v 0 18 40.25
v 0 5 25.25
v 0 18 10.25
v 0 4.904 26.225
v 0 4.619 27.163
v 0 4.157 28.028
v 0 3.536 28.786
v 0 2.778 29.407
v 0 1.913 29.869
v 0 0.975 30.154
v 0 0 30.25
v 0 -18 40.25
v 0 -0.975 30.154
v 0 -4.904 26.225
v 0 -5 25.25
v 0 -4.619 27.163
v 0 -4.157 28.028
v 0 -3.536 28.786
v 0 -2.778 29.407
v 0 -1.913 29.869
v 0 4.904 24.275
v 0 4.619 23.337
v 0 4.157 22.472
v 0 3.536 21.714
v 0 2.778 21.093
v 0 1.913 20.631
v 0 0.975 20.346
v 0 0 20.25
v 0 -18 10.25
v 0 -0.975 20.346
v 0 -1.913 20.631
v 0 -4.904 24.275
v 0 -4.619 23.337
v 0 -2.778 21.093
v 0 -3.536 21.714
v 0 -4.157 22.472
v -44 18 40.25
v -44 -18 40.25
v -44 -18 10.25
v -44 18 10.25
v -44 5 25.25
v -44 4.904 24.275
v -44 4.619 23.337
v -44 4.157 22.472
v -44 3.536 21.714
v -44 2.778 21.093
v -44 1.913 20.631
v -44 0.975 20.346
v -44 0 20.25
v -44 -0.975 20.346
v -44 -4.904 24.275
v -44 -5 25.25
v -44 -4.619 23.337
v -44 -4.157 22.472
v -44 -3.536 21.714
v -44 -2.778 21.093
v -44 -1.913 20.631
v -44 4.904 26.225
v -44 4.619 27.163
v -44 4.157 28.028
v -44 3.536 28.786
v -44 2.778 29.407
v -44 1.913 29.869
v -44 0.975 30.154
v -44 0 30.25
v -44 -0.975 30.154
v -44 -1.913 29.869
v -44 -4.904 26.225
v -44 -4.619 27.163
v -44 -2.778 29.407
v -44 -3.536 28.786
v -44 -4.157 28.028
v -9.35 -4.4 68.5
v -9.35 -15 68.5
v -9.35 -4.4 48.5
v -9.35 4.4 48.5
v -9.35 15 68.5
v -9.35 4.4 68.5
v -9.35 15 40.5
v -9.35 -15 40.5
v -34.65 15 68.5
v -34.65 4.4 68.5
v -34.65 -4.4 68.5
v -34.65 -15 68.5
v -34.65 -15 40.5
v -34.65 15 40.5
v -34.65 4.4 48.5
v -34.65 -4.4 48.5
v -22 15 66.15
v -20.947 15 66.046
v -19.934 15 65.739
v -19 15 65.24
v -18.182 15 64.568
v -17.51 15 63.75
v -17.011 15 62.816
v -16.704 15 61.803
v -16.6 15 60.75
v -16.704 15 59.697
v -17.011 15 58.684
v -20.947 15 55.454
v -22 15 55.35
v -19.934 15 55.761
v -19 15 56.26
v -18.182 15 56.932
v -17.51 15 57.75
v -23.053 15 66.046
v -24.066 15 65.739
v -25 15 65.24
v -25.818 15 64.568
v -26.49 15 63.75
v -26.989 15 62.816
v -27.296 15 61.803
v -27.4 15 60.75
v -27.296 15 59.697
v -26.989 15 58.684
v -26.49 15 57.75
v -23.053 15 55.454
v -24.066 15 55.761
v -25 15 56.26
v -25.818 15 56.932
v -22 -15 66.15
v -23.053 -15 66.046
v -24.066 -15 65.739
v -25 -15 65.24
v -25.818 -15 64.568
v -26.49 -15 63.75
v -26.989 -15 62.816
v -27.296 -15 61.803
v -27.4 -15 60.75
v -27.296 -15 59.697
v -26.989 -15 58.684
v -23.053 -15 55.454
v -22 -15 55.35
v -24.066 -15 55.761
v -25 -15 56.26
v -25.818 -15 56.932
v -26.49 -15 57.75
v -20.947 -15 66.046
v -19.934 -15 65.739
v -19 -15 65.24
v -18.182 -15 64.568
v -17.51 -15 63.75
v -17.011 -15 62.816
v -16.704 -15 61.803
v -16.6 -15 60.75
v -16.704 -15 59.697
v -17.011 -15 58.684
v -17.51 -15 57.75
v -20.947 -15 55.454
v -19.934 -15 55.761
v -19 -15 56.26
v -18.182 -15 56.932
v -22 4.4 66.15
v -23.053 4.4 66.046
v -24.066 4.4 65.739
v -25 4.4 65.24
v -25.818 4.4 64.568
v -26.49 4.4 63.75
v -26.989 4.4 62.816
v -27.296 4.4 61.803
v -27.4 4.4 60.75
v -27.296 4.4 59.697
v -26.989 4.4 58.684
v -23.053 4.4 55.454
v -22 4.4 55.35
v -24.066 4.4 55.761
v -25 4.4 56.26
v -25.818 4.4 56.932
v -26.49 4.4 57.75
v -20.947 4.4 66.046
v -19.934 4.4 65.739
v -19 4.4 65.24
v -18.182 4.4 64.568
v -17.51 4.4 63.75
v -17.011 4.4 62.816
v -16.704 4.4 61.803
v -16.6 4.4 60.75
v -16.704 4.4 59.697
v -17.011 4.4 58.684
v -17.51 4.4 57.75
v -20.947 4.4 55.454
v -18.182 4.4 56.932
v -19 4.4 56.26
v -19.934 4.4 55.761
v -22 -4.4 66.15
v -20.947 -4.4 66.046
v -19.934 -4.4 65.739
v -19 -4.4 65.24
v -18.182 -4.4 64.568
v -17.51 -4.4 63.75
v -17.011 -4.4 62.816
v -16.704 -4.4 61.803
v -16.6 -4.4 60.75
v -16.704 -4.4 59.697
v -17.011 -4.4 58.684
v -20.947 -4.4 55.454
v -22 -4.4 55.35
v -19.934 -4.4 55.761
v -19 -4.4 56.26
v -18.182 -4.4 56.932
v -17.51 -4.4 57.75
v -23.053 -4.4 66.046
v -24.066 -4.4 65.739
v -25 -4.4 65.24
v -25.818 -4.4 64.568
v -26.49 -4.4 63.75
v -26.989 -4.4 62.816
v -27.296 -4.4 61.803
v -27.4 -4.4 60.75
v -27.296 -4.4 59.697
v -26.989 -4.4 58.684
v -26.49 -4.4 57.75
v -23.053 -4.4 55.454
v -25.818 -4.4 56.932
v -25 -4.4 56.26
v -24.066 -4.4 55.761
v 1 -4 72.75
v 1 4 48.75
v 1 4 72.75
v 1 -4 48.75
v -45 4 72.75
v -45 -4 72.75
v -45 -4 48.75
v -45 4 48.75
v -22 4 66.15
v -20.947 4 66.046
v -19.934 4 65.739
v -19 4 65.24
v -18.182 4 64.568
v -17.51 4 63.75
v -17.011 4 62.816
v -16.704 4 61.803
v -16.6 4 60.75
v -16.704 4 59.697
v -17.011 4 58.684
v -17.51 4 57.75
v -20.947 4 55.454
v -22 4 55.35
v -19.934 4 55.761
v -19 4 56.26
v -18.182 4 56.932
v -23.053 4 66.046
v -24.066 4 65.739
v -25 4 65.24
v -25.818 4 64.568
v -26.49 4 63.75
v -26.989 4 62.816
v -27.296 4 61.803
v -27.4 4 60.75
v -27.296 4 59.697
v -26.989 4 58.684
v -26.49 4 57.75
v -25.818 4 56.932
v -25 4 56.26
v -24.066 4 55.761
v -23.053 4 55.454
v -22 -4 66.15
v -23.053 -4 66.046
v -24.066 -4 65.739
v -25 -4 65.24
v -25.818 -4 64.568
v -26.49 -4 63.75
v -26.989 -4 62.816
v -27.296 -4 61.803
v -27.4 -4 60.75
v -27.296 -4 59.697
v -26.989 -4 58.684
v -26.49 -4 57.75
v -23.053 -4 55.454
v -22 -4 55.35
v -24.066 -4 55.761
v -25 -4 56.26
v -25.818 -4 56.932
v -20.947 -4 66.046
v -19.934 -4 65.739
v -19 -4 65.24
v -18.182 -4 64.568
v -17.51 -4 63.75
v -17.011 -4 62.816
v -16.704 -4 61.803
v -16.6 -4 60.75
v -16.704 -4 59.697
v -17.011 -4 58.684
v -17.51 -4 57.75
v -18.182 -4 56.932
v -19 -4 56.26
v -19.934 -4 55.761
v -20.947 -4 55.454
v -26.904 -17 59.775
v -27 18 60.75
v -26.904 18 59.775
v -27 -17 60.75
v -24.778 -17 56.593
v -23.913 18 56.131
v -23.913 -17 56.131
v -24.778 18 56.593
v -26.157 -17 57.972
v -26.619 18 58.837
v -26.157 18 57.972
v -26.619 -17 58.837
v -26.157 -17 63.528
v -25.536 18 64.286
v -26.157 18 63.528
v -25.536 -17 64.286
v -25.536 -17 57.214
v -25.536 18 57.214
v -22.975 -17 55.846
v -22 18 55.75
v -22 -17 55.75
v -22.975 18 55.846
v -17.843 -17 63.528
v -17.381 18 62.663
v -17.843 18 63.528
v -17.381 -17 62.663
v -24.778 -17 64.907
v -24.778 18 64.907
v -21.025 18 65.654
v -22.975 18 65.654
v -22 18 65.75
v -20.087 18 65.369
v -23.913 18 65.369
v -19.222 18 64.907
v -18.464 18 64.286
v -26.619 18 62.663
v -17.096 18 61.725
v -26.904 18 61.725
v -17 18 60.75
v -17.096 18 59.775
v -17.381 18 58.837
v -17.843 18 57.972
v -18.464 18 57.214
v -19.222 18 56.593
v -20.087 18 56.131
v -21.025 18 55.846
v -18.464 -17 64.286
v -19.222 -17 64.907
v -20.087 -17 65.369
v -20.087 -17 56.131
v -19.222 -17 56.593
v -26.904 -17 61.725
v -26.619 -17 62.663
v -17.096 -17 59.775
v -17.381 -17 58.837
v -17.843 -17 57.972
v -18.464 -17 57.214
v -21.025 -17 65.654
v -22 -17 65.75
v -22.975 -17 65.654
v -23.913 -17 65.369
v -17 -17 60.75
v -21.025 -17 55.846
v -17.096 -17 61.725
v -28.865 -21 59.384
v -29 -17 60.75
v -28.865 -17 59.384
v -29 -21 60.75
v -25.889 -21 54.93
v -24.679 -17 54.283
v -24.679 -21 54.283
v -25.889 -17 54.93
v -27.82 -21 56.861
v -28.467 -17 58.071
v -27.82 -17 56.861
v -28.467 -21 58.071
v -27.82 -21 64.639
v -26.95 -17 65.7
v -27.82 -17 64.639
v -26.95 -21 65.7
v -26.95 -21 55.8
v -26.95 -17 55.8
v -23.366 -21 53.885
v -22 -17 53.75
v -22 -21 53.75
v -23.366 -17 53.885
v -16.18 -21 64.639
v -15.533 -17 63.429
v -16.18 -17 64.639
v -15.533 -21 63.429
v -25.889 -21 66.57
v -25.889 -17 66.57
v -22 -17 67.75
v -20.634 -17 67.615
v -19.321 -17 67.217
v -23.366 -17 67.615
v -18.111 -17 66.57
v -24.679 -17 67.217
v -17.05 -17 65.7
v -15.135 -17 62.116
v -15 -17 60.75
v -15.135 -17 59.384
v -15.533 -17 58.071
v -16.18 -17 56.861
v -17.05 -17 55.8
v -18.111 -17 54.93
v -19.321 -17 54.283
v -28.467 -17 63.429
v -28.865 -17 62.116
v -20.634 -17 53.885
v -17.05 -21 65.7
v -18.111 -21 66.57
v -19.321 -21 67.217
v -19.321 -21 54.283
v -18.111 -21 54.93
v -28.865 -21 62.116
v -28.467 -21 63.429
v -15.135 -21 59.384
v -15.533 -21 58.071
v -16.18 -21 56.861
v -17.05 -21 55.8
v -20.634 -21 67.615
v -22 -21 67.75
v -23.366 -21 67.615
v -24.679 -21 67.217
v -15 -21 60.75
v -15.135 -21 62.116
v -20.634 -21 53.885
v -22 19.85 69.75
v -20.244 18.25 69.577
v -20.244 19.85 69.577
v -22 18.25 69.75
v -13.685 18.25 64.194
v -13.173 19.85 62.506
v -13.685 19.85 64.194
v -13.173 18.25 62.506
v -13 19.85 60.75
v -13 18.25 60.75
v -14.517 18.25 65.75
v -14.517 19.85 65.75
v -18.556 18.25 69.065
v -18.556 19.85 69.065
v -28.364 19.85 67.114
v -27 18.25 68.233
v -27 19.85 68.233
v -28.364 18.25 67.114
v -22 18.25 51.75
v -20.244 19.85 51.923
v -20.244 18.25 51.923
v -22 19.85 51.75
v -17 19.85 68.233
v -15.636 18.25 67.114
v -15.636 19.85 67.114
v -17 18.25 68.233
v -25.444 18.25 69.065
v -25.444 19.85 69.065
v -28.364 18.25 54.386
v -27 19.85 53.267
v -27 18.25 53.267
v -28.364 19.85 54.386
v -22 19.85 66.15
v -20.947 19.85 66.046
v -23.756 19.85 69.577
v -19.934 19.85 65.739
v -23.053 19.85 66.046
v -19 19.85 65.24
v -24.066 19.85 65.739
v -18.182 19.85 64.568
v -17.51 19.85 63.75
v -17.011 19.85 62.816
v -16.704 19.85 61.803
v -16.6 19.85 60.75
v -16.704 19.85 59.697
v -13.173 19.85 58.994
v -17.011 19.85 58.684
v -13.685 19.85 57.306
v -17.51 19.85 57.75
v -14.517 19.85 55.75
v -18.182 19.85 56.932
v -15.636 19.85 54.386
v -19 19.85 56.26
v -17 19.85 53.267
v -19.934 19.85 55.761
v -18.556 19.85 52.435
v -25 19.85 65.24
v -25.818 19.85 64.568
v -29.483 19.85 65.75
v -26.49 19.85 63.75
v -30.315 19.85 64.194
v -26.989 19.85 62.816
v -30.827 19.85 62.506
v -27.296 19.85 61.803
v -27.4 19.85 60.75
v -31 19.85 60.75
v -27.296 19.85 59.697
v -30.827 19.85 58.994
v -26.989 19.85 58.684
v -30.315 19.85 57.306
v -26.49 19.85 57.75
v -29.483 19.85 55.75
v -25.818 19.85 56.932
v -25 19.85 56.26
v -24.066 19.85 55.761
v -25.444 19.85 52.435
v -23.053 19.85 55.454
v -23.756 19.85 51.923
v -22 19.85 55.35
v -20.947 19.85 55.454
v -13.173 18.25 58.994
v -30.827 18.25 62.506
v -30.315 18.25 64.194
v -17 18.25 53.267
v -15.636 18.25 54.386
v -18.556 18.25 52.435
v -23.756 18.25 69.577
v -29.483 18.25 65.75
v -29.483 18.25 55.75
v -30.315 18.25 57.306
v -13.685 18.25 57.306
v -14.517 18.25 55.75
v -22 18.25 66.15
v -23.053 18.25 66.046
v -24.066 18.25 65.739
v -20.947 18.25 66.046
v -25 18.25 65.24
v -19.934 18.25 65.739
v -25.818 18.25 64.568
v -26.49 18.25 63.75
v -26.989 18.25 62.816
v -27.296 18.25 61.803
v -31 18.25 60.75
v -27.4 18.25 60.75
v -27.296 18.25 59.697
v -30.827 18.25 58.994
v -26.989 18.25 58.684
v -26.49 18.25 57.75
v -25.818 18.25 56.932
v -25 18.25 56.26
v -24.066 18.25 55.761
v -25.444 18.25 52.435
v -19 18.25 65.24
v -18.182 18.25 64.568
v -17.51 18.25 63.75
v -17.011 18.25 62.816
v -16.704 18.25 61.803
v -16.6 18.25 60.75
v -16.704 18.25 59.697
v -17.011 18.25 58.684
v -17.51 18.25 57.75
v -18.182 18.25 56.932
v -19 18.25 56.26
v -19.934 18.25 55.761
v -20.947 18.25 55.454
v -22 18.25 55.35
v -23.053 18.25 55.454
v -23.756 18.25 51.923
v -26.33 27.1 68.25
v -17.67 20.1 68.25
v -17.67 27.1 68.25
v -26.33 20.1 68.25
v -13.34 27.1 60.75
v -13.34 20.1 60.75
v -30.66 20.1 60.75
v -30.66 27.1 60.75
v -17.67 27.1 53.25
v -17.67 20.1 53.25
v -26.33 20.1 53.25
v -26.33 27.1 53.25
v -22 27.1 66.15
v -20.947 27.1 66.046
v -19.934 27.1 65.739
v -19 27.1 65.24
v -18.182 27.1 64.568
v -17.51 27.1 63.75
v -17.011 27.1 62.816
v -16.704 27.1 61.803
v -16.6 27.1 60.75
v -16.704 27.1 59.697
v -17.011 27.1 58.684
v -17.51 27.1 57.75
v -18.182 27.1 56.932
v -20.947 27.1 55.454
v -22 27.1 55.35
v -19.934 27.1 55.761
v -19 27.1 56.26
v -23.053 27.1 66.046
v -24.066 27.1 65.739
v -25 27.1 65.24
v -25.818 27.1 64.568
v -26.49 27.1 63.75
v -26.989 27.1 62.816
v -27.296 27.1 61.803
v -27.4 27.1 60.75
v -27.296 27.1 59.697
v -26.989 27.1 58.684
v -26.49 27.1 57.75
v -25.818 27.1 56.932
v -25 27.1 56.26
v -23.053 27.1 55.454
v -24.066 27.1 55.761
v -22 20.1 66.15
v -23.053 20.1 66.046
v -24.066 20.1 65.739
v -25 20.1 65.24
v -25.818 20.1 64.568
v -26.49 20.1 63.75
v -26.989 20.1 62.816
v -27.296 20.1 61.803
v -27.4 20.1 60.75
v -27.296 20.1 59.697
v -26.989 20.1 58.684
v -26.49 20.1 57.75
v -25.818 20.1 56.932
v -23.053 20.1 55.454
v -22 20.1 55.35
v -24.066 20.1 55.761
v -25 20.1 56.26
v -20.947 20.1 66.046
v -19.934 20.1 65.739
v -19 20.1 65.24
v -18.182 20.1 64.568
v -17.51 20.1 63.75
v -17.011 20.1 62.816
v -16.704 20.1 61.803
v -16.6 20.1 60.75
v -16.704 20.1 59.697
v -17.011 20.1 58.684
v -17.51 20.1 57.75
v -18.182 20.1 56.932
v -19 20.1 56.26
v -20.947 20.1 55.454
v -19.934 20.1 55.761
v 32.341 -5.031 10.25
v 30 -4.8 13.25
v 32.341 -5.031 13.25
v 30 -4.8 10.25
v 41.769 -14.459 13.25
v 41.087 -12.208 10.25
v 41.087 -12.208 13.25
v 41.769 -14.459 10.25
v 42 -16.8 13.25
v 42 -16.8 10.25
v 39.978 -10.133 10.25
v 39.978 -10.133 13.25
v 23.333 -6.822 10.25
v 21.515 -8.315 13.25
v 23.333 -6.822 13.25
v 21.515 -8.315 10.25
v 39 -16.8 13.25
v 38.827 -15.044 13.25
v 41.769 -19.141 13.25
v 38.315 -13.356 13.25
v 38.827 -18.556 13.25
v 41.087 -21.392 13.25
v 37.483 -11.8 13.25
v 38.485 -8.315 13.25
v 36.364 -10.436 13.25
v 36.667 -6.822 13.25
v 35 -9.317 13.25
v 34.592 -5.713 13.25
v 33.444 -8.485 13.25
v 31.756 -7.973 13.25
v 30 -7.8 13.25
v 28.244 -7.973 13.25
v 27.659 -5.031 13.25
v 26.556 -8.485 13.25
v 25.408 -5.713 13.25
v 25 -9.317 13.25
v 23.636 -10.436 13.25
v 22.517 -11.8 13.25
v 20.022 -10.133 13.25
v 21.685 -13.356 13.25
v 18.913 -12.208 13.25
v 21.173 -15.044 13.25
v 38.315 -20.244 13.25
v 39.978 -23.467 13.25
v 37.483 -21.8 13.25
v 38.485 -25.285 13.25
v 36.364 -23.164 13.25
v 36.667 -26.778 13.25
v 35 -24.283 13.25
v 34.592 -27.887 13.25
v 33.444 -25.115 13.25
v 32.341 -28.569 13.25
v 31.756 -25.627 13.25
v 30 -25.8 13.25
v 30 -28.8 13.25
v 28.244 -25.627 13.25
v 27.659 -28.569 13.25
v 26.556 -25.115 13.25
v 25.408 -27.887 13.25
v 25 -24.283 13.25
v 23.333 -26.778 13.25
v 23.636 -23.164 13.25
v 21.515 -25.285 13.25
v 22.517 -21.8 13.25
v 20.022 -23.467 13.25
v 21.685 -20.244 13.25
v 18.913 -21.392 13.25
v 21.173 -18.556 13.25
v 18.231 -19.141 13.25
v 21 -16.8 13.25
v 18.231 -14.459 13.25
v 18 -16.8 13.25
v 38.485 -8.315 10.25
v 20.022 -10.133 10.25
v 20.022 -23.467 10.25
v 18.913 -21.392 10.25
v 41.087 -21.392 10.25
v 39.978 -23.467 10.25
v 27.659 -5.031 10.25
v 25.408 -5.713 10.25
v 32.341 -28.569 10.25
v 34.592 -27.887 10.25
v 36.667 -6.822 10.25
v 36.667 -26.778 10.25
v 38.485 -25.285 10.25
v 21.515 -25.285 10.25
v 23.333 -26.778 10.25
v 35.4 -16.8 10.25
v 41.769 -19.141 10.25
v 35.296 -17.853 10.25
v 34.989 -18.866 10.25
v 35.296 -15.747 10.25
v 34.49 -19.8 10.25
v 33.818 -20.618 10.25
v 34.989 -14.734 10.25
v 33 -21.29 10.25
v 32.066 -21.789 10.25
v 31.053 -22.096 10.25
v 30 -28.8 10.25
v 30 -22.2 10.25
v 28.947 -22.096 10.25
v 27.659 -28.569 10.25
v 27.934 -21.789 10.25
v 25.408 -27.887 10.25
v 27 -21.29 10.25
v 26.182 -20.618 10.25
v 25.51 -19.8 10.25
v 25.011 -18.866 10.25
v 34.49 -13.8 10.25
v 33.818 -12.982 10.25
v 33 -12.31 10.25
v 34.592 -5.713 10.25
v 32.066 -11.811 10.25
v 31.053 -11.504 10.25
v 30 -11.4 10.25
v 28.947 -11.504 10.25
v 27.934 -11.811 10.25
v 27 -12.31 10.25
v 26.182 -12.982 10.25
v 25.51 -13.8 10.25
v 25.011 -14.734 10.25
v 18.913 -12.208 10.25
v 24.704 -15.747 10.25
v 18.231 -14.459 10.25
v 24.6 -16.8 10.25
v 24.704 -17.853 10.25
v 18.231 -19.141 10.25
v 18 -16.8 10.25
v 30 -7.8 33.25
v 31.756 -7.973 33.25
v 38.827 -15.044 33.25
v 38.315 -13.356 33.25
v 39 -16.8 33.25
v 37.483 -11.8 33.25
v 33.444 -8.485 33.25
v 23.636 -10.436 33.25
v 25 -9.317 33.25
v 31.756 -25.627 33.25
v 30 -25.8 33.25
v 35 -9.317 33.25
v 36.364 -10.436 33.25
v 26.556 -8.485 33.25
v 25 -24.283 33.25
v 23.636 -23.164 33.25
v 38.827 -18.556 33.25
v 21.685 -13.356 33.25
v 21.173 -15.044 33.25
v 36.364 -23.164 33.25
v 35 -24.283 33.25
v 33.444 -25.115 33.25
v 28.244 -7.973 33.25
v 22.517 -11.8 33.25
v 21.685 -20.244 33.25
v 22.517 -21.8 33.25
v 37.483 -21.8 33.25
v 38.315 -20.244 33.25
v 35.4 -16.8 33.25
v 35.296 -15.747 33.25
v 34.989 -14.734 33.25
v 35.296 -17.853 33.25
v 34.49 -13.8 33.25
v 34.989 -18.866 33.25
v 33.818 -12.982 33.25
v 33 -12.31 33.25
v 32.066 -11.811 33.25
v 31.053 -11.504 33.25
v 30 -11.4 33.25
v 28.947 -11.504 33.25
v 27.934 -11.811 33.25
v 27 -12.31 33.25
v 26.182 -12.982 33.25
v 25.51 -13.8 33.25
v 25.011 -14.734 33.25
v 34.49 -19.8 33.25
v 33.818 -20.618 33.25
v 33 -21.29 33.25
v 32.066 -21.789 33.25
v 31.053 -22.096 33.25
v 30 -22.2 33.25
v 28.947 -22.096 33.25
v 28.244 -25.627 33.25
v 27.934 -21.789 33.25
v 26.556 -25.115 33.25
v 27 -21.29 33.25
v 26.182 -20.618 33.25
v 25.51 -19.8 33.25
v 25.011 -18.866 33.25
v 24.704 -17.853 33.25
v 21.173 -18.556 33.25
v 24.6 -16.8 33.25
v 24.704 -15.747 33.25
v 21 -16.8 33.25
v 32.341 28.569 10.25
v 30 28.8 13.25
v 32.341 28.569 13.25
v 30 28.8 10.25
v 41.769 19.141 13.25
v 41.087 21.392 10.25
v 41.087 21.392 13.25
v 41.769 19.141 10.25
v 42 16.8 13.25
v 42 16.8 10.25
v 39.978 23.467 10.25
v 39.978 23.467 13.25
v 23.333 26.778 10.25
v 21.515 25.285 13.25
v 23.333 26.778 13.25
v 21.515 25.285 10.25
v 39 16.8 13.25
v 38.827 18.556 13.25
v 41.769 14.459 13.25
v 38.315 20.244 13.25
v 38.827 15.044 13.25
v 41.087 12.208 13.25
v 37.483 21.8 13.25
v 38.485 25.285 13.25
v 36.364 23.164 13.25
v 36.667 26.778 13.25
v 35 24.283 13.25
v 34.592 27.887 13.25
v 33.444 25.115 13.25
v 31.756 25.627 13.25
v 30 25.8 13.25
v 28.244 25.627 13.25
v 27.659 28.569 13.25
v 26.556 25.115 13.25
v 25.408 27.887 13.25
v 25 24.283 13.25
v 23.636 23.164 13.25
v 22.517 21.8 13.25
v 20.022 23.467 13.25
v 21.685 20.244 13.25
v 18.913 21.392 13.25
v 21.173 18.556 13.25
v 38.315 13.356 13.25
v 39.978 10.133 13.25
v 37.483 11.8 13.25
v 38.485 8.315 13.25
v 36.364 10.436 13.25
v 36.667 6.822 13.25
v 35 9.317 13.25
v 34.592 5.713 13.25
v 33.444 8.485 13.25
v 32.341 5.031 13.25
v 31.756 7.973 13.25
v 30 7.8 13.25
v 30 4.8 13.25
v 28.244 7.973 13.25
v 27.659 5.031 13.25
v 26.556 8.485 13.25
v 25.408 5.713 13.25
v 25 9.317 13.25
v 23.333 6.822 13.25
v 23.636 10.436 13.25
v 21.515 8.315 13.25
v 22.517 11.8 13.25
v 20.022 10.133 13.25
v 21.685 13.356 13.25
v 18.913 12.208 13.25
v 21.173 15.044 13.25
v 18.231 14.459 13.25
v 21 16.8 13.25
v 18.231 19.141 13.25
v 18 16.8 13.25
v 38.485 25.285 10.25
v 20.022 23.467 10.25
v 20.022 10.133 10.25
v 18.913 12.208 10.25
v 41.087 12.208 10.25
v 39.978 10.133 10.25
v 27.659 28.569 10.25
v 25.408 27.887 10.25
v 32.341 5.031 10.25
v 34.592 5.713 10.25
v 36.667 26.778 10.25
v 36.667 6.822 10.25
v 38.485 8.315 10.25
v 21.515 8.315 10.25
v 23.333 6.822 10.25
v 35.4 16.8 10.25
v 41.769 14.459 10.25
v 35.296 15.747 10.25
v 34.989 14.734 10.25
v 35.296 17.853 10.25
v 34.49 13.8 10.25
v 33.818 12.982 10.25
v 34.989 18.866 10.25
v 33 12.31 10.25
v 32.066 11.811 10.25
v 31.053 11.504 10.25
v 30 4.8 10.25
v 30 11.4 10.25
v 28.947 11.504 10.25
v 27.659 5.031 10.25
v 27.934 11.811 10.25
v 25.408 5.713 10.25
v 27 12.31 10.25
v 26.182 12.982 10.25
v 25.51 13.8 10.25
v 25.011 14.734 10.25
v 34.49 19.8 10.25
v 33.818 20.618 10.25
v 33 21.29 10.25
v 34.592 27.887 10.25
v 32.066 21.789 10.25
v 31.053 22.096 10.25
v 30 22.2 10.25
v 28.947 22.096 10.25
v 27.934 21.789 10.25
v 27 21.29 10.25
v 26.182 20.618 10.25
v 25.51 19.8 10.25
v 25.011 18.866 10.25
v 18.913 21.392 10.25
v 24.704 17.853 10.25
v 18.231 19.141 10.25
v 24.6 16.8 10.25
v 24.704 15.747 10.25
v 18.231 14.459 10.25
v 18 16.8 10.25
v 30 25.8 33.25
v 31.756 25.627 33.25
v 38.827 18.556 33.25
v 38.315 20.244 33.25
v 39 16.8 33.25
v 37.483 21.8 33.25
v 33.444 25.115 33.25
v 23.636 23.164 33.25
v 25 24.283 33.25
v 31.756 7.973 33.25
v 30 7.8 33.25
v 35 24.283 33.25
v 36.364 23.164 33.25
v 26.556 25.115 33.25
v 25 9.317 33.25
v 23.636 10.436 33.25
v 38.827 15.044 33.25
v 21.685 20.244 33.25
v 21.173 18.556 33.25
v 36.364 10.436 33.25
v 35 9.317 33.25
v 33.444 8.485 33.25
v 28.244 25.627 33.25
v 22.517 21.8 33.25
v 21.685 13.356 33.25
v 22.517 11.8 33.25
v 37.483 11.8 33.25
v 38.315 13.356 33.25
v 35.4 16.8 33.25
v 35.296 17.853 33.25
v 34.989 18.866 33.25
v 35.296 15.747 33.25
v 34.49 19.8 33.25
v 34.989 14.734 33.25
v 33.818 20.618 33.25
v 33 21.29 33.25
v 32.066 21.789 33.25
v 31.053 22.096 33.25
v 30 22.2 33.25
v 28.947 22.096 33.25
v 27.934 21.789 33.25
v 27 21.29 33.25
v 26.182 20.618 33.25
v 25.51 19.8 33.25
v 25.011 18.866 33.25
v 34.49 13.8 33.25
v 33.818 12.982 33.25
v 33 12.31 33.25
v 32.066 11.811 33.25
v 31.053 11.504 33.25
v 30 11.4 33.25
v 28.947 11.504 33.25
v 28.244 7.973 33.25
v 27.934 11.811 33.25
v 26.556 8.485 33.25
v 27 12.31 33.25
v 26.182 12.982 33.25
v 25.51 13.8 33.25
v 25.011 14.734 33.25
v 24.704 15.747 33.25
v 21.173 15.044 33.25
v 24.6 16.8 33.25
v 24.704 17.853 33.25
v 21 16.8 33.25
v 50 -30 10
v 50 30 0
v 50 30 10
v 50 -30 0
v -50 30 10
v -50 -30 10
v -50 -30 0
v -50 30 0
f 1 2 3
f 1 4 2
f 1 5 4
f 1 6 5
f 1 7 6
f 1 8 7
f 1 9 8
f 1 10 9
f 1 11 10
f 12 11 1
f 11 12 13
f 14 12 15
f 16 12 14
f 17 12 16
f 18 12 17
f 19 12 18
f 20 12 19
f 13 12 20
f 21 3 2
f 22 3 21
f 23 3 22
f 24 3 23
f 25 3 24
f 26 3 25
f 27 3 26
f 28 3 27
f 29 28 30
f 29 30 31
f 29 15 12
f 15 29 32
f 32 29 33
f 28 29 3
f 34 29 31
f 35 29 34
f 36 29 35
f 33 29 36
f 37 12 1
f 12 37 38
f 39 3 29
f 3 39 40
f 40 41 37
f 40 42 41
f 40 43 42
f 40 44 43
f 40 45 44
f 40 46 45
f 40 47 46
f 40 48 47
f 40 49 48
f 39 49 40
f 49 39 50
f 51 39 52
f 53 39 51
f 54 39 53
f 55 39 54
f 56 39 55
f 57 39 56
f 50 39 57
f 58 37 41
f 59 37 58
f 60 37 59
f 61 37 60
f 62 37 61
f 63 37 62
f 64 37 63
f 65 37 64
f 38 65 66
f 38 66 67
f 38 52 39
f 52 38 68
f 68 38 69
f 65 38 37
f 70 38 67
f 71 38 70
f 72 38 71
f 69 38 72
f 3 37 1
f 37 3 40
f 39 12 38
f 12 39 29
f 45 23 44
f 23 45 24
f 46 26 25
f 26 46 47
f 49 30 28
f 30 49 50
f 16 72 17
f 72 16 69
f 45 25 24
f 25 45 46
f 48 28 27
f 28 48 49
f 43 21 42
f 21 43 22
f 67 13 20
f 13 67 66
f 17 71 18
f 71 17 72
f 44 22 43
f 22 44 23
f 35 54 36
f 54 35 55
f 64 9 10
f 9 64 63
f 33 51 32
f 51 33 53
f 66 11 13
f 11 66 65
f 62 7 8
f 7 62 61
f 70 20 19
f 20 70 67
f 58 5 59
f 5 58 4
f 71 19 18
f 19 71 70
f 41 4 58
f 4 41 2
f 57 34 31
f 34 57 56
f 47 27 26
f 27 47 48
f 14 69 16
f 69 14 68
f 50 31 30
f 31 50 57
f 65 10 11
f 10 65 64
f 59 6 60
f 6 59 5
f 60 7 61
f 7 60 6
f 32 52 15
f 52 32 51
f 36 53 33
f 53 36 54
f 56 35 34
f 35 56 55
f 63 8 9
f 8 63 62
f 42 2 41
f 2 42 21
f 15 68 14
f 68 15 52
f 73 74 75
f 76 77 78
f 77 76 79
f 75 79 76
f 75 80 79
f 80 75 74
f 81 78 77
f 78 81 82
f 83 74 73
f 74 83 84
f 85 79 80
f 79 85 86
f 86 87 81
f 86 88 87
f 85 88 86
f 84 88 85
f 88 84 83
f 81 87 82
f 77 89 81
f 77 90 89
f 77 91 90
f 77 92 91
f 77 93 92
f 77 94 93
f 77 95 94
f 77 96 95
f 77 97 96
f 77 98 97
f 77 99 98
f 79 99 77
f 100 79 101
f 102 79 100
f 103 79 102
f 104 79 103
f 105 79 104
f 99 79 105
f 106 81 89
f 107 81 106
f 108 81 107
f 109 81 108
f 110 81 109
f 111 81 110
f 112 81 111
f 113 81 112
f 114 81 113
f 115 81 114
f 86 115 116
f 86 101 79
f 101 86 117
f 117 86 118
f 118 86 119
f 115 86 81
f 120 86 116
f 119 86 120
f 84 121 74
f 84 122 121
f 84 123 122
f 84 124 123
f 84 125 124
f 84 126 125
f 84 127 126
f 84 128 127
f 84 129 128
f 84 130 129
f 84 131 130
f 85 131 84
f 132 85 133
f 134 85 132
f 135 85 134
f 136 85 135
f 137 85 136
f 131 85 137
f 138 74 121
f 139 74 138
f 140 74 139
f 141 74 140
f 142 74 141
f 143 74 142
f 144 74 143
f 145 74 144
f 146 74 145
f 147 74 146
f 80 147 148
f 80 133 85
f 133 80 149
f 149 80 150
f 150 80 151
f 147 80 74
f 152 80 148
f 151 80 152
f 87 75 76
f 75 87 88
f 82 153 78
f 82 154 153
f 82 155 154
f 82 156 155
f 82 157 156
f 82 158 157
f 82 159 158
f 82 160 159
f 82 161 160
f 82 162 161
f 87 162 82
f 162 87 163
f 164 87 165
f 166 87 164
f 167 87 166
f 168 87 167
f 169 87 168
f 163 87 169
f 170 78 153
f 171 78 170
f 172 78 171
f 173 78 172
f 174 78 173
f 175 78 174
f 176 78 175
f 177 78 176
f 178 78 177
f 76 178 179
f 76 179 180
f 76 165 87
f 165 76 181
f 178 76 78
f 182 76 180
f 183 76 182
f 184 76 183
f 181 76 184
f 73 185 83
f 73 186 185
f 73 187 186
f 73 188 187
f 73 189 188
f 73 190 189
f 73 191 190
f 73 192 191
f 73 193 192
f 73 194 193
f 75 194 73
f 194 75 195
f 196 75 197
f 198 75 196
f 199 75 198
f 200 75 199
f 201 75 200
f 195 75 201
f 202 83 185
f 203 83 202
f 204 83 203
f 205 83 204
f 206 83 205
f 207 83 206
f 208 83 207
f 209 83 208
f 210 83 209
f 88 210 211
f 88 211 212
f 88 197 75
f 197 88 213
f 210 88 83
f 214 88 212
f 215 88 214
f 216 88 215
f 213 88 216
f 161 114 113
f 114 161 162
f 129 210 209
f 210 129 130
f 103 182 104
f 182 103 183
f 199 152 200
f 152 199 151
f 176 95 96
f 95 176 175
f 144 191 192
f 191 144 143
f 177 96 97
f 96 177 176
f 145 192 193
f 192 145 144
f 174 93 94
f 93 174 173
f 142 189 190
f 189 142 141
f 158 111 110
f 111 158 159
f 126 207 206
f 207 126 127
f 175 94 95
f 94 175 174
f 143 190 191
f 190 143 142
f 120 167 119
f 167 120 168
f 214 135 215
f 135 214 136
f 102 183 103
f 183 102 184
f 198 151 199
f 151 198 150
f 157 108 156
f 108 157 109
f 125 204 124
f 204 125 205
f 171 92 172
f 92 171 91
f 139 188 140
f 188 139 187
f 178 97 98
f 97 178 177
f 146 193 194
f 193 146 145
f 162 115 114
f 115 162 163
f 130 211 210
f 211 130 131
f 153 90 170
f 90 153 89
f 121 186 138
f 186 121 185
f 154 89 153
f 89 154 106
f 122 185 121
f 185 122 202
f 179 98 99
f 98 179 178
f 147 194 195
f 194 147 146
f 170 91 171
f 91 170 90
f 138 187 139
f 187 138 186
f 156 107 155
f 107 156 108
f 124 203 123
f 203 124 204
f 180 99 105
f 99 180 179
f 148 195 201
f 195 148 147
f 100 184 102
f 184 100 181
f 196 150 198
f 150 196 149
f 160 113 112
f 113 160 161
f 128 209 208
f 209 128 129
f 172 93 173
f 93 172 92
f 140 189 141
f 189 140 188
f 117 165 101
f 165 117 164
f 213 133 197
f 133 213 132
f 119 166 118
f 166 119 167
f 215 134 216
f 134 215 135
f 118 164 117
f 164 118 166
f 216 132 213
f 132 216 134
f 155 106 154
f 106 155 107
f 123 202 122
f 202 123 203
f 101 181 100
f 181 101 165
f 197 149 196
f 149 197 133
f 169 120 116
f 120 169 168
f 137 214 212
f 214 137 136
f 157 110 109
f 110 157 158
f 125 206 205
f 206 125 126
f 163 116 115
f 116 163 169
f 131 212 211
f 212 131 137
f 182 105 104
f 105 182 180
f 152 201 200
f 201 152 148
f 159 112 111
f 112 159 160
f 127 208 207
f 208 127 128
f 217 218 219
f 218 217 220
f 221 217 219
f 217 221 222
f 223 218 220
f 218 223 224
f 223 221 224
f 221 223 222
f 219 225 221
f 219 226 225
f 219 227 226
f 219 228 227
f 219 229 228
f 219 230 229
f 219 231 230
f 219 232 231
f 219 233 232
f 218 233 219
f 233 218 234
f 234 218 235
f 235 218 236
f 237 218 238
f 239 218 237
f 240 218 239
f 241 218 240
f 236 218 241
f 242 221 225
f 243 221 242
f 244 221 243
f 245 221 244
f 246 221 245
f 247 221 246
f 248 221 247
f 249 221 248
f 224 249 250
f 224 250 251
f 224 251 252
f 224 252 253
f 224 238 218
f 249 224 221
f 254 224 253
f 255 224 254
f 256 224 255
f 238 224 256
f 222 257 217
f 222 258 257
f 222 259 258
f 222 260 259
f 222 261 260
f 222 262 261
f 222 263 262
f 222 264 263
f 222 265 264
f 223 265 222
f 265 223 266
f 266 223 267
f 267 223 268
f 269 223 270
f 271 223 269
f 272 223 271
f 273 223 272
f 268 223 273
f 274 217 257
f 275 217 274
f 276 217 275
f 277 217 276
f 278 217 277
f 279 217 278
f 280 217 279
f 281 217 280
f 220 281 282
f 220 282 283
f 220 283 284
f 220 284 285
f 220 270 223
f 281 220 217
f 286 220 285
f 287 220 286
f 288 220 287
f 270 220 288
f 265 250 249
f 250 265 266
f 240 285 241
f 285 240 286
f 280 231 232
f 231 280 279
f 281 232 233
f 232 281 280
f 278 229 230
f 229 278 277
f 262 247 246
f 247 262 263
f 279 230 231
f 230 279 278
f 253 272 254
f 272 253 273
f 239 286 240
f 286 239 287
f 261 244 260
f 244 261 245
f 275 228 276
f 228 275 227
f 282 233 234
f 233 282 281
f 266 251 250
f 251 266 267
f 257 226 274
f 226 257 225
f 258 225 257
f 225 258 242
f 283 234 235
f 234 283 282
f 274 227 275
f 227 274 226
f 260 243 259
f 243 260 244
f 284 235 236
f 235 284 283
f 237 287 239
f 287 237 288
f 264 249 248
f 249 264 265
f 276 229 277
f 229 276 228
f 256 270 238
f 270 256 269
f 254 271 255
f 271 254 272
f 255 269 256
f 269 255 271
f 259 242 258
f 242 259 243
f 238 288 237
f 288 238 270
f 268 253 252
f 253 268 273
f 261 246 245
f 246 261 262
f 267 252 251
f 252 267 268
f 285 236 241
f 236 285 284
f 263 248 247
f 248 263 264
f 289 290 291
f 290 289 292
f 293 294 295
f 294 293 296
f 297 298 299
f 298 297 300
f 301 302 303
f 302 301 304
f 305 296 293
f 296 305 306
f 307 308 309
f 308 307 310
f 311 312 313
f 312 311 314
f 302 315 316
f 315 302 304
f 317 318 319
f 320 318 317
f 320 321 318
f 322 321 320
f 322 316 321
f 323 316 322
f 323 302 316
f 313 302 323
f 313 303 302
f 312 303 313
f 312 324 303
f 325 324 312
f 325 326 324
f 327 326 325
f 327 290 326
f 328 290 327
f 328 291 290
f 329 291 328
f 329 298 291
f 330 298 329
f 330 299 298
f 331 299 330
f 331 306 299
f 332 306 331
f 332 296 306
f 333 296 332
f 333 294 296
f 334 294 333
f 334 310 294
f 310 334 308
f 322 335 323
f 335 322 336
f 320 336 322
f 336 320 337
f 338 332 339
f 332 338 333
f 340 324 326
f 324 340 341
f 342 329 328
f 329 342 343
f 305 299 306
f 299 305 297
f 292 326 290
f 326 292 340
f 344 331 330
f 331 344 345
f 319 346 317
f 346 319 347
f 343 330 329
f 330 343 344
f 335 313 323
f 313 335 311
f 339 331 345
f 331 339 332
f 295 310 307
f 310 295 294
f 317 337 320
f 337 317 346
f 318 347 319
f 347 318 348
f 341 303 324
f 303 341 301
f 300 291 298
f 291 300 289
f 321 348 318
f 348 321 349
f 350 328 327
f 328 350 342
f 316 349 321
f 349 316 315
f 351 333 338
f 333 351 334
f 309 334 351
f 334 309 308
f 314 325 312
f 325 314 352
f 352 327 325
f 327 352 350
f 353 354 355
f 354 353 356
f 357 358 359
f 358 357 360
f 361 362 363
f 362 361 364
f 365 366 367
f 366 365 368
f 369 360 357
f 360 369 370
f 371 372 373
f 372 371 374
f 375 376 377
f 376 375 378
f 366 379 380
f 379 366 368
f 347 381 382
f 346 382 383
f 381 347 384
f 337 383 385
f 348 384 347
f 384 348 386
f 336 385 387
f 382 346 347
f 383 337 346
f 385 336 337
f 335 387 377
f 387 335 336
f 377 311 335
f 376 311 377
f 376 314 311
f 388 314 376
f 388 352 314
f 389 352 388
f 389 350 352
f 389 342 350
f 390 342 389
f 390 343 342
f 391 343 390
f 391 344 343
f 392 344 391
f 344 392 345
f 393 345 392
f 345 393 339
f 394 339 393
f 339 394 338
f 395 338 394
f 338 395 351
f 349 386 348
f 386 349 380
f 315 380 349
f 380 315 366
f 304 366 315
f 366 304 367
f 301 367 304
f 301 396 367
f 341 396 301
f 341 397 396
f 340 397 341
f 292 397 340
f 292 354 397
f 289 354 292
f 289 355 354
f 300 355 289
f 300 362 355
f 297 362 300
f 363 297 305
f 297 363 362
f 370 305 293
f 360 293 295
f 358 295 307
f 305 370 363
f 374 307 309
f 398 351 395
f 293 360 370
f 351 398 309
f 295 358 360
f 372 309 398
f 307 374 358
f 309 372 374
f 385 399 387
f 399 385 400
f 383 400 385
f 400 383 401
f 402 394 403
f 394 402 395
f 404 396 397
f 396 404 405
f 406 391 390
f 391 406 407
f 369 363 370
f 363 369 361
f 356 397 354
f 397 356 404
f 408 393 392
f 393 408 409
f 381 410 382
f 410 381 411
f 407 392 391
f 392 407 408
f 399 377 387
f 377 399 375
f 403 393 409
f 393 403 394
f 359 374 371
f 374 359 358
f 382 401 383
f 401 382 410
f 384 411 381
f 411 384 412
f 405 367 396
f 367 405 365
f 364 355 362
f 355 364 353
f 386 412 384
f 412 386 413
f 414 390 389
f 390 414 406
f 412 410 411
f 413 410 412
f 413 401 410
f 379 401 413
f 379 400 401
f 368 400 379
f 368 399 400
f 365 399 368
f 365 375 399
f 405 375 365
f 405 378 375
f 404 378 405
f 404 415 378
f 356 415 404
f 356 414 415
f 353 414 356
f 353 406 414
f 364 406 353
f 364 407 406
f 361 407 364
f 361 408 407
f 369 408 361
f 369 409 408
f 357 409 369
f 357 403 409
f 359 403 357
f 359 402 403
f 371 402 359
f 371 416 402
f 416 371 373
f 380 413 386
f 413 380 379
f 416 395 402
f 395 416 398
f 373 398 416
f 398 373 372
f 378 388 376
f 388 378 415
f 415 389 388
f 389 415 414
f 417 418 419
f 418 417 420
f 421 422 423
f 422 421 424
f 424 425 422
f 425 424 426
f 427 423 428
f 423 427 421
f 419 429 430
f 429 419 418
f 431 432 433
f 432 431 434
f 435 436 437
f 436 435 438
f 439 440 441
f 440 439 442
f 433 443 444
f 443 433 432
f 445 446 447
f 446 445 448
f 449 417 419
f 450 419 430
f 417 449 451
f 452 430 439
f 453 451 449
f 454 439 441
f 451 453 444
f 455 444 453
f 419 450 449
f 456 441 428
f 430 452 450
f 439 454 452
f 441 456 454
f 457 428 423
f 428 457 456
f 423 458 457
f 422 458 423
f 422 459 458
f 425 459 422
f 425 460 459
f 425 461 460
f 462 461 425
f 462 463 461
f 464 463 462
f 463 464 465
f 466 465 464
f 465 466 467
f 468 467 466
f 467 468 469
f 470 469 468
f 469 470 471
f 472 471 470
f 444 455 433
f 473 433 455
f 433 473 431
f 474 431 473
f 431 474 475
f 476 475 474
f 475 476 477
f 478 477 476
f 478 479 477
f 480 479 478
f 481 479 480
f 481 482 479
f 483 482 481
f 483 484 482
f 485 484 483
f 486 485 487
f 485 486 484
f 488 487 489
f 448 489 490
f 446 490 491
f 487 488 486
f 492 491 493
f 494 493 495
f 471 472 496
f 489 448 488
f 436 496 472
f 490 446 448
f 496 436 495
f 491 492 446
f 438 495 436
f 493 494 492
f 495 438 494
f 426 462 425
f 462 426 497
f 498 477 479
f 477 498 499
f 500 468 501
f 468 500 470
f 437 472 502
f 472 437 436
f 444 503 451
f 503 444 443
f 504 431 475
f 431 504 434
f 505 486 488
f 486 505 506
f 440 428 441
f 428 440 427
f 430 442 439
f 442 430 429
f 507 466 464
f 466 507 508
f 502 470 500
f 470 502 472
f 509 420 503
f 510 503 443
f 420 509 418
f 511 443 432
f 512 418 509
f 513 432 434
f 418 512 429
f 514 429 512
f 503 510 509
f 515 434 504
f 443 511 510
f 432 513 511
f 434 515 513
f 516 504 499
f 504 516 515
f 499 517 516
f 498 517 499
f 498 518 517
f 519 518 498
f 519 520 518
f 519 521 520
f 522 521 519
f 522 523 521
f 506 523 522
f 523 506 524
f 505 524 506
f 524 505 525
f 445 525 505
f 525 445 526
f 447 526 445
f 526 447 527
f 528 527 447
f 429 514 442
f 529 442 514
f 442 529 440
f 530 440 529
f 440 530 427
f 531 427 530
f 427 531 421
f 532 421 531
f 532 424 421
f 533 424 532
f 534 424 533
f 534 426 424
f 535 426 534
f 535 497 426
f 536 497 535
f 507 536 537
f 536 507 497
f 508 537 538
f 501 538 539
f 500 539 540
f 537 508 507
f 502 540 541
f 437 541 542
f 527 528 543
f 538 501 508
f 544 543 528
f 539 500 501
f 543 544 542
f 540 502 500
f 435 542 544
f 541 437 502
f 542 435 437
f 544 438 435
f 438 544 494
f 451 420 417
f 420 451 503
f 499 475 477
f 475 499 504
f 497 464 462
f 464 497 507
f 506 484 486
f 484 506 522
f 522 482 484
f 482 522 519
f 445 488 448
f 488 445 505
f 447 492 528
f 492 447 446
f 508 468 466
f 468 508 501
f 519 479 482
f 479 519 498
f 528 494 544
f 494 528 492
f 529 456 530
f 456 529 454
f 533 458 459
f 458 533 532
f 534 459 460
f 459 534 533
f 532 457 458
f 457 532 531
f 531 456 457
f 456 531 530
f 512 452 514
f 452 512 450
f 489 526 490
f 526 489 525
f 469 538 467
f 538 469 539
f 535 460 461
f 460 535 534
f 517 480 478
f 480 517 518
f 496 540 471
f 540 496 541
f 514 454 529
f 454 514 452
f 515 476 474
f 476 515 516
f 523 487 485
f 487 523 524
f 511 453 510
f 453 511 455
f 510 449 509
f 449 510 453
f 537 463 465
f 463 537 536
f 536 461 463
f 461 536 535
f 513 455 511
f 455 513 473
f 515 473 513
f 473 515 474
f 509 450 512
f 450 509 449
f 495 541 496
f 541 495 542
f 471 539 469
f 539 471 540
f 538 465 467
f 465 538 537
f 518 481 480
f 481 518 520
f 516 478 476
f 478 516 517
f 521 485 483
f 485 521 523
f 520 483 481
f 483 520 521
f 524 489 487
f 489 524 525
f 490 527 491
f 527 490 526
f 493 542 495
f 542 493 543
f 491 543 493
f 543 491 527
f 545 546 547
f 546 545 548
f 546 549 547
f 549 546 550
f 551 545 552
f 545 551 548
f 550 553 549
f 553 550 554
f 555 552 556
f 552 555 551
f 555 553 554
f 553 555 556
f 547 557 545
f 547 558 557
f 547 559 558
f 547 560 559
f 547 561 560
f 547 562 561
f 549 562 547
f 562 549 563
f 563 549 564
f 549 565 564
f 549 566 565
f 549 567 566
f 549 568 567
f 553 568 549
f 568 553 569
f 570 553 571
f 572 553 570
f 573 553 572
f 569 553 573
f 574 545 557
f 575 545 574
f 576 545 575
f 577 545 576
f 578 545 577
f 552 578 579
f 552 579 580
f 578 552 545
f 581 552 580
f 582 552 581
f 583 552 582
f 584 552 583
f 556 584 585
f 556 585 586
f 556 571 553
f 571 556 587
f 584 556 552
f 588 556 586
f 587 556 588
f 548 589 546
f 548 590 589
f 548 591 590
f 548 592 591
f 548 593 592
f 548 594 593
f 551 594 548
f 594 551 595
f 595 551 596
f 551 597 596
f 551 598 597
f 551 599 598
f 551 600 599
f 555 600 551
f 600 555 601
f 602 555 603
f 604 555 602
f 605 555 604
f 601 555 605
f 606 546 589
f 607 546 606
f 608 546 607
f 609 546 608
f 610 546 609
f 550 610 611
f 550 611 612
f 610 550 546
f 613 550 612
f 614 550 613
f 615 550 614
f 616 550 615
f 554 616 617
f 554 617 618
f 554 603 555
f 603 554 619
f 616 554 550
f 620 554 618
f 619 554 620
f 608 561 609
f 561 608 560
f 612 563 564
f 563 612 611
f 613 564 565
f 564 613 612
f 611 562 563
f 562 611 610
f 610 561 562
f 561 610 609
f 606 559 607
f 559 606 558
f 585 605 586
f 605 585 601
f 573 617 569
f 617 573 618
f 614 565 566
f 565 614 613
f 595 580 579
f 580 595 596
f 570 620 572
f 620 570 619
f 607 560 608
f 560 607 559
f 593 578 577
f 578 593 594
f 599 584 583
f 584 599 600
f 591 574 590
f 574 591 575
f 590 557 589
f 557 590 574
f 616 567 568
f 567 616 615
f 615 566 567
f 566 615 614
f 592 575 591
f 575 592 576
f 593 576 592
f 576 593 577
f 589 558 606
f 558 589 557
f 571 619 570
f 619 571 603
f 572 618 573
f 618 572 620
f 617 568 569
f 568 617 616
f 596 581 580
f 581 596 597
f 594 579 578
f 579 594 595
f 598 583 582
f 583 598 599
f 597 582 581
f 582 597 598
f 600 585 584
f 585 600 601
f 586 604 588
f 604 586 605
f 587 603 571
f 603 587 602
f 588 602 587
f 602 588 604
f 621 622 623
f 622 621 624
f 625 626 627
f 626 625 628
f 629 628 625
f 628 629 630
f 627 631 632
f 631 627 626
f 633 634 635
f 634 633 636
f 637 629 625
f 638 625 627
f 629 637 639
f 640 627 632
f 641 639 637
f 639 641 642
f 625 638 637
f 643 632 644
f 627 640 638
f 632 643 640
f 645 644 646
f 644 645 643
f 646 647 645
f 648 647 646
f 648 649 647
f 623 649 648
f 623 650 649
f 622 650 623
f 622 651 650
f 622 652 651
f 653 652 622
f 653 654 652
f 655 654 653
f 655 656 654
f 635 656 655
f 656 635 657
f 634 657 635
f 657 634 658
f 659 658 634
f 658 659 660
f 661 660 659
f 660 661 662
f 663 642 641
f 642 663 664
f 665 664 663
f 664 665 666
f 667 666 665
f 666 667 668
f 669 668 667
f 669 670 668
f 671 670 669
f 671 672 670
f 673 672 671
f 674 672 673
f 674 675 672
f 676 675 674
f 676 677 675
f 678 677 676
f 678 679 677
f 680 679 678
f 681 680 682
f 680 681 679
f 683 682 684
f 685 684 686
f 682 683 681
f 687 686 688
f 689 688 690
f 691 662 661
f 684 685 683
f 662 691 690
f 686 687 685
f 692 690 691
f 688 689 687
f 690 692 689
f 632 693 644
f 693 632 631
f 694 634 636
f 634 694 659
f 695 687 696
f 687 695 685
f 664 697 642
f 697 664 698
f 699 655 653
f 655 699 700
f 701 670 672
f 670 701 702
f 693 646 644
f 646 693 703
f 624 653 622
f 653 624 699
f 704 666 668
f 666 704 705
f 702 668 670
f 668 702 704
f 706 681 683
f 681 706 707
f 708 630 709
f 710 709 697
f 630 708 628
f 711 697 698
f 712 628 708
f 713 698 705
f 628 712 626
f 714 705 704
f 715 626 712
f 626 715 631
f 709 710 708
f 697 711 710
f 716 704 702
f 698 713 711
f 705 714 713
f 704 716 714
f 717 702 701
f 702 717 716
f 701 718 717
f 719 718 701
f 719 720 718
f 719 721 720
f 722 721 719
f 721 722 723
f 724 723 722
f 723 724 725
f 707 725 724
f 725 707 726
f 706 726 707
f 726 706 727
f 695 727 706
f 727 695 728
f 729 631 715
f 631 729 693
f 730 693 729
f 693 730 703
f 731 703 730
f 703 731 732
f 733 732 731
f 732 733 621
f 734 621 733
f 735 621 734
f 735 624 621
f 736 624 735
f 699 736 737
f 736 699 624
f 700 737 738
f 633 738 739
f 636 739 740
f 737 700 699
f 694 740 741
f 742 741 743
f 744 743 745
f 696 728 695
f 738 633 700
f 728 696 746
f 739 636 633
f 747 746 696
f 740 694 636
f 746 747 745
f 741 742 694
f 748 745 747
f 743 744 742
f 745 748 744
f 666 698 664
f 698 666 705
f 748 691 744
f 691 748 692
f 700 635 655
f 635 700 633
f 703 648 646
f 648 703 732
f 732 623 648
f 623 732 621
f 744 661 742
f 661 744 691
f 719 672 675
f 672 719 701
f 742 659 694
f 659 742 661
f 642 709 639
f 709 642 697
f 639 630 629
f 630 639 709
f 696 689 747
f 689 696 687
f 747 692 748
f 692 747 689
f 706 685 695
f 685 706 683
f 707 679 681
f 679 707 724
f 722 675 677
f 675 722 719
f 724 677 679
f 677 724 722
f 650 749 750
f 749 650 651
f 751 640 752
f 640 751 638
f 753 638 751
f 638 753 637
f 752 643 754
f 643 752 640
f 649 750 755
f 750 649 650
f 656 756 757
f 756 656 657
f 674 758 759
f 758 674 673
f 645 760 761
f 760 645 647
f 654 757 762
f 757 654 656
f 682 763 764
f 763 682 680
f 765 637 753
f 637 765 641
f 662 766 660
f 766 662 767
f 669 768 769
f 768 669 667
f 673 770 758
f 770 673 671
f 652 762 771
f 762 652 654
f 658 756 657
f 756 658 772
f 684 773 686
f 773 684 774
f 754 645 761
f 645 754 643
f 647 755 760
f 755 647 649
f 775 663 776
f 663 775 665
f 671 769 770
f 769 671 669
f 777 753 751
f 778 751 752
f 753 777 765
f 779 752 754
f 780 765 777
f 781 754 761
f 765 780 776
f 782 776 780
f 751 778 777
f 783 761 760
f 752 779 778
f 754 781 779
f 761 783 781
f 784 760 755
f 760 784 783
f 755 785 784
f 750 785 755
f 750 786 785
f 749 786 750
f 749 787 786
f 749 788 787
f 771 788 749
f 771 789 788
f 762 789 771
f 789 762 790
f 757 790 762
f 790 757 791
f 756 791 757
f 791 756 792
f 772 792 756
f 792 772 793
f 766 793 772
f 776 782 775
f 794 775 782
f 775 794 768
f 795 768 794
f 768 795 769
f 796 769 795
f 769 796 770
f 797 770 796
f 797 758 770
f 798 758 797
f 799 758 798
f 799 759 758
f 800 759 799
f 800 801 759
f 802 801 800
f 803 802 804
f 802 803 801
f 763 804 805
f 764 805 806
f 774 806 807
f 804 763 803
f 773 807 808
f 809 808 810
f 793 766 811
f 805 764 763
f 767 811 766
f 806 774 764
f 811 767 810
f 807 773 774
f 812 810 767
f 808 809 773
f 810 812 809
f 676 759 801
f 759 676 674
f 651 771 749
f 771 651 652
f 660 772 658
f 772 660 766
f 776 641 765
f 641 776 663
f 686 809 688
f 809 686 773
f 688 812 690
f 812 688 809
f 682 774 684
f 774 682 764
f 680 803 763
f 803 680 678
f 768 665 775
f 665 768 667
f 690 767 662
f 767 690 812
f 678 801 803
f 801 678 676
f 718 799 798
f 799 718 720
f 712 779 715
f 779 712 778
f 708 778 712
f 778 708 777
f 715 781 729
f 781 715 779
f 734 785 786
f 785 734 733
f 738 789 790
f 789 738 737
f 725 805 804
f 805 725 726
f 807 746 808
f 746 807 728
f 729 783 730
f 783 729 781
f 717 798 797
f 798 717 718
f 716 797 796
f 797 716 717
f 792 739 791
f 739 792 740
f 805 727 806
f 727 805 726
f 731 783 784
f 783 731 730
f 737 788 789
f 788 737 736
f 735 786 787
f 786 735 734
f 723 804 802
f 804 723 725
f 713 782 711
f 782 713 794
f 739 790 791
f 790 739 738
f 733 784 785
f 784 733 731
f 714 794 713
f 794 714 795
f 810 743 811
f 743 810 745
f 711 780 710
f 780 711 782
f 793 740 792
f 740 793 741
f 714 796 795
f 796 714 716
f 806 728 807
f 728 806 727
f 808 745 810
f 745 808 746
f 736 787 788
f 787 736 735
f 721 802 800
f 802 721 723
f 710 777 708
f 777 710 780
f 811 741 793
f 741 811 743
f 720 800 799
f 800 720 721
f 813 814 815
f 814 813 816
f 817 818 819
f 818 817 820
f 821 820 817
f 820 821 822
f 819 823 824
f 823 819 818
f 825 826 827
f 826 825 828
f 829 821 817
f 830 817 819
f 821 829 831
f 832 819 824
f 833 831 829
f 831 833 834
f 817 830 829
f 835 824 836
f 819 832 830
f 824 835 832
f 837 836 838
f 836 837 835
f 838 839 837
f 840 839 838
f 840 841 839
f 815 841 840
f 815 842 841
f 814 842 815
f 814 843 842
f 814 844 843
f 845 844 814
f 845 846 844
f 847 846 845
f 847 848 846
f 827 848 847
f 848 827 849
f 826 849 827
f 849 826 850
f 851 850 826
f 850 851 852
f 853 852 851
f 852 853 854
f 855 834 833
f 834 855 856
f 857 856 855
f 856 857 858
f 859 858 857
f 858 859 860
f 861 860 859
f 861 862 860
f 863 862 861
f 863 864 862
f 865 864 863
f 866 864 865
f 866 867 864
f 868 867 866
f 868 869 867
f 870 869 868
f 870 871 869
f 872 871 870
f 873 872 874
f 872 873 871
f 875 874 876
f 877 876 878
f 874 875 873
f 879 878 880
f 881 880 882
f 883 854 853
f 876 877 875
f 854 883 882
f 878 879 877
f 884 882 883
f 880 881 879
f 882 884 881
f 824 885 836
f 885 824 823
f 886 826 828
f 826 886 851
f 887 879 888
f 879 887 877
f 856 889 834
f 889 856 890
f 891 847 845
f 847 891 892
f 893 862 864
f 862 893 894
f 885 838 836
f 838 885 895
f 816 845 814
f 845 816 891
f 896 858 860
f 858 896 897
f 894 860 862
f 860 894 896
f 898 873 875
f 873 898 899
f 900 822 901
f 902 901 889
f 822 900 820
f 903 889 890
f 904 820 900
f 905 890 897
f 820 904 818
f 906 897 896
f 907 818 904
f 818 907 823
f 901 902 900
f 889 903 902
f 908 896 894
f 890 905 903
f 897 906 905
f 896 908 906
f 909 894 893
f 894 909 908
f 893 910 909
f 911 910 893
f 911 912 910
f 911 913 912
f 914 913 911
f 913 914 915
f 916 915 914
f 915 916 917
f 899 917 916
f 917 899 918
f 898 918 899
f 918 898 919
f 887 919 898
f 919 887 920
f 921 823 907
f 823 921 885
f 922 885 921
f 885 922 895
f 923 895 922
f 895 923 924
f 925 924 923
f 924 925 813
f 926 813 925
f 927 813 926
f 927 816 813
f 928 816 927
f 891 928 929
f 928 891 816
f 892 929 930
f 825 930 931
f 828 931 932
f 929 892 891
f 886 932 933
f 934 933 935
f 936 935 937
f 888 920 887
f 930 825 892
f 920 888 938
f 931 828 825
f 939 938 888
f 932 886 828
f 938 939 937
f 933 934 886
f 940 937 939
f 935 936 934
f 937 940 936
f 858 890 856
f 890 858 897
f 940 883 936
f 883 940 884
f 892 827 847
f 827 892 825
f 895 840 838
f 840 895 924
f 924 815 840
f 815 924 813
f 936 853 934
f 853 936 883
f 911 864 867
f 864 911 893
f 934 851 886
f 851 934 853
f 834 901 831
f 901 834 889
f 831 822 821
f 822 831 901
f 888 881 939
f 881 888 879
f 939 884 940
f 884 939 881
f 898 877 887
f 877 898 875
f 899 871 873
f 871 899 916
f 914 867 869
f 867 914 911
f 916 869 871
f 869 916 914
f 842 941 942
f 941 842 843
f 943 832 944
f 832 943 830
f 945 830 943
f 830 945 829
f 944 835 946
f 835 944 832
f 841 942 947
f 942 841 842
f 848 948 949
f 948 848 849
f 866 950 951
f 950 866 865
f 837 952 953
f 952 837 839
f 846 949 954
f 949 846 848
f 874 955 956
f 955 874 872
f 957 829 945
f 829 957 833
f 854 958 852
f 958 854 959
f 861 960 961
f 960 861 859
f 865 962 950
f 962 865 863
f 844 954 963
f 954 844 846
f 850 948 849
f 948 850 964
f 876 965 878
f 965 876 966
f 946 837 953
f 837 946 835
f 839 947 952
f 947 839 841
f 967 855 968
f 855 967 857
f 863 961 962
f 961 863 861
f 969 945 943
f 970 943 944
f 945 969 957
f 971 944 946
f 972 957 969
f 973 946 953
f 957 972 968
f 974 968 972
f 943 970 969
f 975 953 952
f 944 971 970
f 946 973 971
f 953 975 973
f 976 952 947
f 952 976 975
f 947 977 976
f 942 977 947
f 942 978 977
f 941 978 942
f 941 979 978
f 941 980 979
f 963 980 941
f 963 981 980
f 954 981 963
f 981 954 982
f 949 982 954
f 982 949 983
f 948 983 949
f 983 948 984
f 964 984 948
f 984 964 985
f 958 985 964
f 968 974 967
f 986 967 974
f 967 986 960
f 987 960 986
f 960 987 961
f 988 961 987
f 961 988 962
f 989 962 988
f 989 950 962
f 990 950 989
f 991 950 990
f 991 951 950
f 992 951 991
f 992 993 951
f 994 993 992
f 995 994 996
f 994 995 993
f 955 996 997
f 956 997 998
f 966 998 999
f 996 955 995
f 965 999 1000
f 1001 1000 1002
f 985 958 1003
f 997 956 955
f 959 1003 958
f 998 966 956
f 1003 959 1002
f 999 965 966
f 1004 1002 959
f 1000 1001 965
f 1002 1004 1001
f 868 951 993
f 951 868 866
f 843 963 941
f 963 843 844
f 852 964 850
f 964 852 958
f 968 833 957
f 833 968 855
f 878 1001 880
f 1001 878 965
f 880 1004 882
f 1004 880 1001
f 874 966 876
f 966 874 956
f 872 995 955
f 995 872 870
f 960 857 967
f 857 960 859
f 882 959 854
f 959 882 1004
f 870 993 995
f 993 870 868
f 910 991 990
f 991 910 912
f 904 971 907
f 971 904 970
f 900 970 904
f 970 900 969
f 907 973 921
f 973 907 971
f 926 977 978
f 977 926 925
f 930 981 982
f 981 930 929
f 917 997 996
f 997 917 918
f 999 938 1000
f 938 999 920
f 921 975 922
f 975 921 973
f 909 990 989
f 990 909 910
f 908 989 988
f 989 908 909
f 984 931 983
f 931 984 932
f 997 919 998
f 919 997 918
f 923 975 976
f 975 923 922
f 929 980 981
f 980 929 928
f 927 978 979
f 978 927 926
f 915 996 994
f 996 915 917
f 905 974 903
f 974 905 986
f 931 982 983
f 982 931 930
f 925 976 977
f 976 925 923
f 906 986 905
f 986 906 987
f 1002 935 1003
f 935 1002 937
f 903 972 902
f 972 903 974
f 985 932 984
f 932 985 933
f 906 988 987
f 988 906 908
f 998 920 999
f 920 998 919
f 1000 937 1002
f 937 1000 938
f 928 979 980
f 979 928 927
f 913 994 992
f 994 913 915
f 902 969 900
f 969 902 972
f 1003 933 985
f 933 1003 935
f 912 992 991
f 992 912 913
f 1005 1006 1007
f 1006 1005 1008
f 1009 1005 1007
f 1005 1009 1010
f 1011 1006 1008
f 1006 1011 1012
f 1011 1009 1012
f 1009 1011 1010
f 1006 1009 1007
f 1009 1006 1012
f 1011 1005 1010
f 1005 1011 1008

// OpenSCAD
$fn = 32;

// ------------------------------------------------------------------------
// Indexing jig: plate 100 x 60 mm, pin d10
// Every part is its own module, assembly() places every instance.
// ------------------------------------------------------------------------

// --- part 1 ---
module jig_plate() {
  difference() {
    translate([-50, -30, 0]) cube([100, 60, 10]);
  }
}

// --- part 2 ---
module locator_block() {
  difference() {
    translate([-22, -18, 0]) cube([44, 36, 30]);
    translate([0, 0, 15]) rotate([0, 90, 0]) cylinder(h = 46, d = 10, center = true);
  }
}

// --- part 3 ---
module index_fork() {
  difference() {
    translate([-12.65, -15, 0]) cube([25.3, 30, 28]);
    translate([-13.65, -4.4, 8]) cube([27.3, 8.8, 21]);
    translate([0, 0, 20.25]) rotate([90, 0, 0]) cylinder(h = 32, d = 10.8, center = true);
  }
}

// --- part 4 ---
module index_arm() {
  difference() {
    translate([-23, -4, 0]) cube([46, 8, 24]);
    translate([0, 0, 12]) rotate([90, 0, 0]) cylinder(h = 10, d = 10.8, center = true);
  }
}

// --- part 5 ---
module index_pin() {
  rotate([0, 90, 0]) cylinder(h = 36, d = 10, center = true);
  translate([-21, 0, 0]) rotate([0, 90, 0]) cylinder(h = 4, d = 14);
}

// --- part 6 ---
module pin_washer() {
  difference() {
      translate([0, 0, 0]) cylinder(h = 1.6, d = 18);
      translate([0, 0, -1]) cylinder(h = 3.6, d = 10.8);
    }
}

// --- part 7 ---
module lock_nut() {
  difference() {
    linear_extrude(height = 7) polygon(points = [[8.66, 0], [4.33, 7.5], [-4.33, 7.5], [-8.66, 0], [-4.33, -7.5], [4.33, -7.5]]);
    translate([0, 0, -1]) cylinder(h = 9, d = 10.8);
  }
}

// --- part 8 ---
module guide_bush_a() {
  difference() {
    union() {
      cylinder(h = 3, d = 24);
      translate([0, 0, 3]) cylinder(h = 20, d = 18);
    }
    translate([0, 0, -1]) cylinder(h = 25, d = 10.8);
  }
}

// --- part 9 ---
module guide_bush_b() {
  difference() {
    union() {
      cylinder(h = 3, d = 24);
      translate([0, 0, 3]) cylinder(h = 20, d = 18);
    }
    translate([0, 0, -1]) cylinder(h = 25, d = 10.8);
  }
}

// --- assembly ---
module assembly() {
  color([0.80, 0.24, 0.20]) translate([0, 0, 0]) rotate([0, 0, 0]) jig_plate();
  color([0.20, 0.45, 0.75]) translate([-22, 0, 10.25]) rotate([0, 0, 0]) locator_block();
  color([0.25, 0.62, 0.32]) translate([-22, 0, 40.5]) rotate([0, 0, 0]) index_fork();
  color([0.92, 0.70, 0.18]) translate([-22, 0, 48.75]) rotate([0, 0, 0]) index_arm();
  color([0.58, 0.35, 0.70]) translate([-22, 0, 60.75]) rotate([0, 0, 90]) index_pin();
  color([0.16, 0.66, 0.66]) translate([-22, 19.85, 60.75]) rotate([90, 0, 0]) pin_washer();
  color([0.85, 0.48, 0.18]) translate([-22, 27.1, 60.75]) rotate([90, 0, 0]) lock_nut();
  color([0.55, 0.60, 0.65]) translate([30, -16.8, 10.25]) rotate([0, 0, 0]) guide_bush_a();
  color([0.75, 0.30, 0.55]) translate([30, 16.8, 10.25]) rotate([0, 0, 0]) guide_bush_b();
}

assembly();
